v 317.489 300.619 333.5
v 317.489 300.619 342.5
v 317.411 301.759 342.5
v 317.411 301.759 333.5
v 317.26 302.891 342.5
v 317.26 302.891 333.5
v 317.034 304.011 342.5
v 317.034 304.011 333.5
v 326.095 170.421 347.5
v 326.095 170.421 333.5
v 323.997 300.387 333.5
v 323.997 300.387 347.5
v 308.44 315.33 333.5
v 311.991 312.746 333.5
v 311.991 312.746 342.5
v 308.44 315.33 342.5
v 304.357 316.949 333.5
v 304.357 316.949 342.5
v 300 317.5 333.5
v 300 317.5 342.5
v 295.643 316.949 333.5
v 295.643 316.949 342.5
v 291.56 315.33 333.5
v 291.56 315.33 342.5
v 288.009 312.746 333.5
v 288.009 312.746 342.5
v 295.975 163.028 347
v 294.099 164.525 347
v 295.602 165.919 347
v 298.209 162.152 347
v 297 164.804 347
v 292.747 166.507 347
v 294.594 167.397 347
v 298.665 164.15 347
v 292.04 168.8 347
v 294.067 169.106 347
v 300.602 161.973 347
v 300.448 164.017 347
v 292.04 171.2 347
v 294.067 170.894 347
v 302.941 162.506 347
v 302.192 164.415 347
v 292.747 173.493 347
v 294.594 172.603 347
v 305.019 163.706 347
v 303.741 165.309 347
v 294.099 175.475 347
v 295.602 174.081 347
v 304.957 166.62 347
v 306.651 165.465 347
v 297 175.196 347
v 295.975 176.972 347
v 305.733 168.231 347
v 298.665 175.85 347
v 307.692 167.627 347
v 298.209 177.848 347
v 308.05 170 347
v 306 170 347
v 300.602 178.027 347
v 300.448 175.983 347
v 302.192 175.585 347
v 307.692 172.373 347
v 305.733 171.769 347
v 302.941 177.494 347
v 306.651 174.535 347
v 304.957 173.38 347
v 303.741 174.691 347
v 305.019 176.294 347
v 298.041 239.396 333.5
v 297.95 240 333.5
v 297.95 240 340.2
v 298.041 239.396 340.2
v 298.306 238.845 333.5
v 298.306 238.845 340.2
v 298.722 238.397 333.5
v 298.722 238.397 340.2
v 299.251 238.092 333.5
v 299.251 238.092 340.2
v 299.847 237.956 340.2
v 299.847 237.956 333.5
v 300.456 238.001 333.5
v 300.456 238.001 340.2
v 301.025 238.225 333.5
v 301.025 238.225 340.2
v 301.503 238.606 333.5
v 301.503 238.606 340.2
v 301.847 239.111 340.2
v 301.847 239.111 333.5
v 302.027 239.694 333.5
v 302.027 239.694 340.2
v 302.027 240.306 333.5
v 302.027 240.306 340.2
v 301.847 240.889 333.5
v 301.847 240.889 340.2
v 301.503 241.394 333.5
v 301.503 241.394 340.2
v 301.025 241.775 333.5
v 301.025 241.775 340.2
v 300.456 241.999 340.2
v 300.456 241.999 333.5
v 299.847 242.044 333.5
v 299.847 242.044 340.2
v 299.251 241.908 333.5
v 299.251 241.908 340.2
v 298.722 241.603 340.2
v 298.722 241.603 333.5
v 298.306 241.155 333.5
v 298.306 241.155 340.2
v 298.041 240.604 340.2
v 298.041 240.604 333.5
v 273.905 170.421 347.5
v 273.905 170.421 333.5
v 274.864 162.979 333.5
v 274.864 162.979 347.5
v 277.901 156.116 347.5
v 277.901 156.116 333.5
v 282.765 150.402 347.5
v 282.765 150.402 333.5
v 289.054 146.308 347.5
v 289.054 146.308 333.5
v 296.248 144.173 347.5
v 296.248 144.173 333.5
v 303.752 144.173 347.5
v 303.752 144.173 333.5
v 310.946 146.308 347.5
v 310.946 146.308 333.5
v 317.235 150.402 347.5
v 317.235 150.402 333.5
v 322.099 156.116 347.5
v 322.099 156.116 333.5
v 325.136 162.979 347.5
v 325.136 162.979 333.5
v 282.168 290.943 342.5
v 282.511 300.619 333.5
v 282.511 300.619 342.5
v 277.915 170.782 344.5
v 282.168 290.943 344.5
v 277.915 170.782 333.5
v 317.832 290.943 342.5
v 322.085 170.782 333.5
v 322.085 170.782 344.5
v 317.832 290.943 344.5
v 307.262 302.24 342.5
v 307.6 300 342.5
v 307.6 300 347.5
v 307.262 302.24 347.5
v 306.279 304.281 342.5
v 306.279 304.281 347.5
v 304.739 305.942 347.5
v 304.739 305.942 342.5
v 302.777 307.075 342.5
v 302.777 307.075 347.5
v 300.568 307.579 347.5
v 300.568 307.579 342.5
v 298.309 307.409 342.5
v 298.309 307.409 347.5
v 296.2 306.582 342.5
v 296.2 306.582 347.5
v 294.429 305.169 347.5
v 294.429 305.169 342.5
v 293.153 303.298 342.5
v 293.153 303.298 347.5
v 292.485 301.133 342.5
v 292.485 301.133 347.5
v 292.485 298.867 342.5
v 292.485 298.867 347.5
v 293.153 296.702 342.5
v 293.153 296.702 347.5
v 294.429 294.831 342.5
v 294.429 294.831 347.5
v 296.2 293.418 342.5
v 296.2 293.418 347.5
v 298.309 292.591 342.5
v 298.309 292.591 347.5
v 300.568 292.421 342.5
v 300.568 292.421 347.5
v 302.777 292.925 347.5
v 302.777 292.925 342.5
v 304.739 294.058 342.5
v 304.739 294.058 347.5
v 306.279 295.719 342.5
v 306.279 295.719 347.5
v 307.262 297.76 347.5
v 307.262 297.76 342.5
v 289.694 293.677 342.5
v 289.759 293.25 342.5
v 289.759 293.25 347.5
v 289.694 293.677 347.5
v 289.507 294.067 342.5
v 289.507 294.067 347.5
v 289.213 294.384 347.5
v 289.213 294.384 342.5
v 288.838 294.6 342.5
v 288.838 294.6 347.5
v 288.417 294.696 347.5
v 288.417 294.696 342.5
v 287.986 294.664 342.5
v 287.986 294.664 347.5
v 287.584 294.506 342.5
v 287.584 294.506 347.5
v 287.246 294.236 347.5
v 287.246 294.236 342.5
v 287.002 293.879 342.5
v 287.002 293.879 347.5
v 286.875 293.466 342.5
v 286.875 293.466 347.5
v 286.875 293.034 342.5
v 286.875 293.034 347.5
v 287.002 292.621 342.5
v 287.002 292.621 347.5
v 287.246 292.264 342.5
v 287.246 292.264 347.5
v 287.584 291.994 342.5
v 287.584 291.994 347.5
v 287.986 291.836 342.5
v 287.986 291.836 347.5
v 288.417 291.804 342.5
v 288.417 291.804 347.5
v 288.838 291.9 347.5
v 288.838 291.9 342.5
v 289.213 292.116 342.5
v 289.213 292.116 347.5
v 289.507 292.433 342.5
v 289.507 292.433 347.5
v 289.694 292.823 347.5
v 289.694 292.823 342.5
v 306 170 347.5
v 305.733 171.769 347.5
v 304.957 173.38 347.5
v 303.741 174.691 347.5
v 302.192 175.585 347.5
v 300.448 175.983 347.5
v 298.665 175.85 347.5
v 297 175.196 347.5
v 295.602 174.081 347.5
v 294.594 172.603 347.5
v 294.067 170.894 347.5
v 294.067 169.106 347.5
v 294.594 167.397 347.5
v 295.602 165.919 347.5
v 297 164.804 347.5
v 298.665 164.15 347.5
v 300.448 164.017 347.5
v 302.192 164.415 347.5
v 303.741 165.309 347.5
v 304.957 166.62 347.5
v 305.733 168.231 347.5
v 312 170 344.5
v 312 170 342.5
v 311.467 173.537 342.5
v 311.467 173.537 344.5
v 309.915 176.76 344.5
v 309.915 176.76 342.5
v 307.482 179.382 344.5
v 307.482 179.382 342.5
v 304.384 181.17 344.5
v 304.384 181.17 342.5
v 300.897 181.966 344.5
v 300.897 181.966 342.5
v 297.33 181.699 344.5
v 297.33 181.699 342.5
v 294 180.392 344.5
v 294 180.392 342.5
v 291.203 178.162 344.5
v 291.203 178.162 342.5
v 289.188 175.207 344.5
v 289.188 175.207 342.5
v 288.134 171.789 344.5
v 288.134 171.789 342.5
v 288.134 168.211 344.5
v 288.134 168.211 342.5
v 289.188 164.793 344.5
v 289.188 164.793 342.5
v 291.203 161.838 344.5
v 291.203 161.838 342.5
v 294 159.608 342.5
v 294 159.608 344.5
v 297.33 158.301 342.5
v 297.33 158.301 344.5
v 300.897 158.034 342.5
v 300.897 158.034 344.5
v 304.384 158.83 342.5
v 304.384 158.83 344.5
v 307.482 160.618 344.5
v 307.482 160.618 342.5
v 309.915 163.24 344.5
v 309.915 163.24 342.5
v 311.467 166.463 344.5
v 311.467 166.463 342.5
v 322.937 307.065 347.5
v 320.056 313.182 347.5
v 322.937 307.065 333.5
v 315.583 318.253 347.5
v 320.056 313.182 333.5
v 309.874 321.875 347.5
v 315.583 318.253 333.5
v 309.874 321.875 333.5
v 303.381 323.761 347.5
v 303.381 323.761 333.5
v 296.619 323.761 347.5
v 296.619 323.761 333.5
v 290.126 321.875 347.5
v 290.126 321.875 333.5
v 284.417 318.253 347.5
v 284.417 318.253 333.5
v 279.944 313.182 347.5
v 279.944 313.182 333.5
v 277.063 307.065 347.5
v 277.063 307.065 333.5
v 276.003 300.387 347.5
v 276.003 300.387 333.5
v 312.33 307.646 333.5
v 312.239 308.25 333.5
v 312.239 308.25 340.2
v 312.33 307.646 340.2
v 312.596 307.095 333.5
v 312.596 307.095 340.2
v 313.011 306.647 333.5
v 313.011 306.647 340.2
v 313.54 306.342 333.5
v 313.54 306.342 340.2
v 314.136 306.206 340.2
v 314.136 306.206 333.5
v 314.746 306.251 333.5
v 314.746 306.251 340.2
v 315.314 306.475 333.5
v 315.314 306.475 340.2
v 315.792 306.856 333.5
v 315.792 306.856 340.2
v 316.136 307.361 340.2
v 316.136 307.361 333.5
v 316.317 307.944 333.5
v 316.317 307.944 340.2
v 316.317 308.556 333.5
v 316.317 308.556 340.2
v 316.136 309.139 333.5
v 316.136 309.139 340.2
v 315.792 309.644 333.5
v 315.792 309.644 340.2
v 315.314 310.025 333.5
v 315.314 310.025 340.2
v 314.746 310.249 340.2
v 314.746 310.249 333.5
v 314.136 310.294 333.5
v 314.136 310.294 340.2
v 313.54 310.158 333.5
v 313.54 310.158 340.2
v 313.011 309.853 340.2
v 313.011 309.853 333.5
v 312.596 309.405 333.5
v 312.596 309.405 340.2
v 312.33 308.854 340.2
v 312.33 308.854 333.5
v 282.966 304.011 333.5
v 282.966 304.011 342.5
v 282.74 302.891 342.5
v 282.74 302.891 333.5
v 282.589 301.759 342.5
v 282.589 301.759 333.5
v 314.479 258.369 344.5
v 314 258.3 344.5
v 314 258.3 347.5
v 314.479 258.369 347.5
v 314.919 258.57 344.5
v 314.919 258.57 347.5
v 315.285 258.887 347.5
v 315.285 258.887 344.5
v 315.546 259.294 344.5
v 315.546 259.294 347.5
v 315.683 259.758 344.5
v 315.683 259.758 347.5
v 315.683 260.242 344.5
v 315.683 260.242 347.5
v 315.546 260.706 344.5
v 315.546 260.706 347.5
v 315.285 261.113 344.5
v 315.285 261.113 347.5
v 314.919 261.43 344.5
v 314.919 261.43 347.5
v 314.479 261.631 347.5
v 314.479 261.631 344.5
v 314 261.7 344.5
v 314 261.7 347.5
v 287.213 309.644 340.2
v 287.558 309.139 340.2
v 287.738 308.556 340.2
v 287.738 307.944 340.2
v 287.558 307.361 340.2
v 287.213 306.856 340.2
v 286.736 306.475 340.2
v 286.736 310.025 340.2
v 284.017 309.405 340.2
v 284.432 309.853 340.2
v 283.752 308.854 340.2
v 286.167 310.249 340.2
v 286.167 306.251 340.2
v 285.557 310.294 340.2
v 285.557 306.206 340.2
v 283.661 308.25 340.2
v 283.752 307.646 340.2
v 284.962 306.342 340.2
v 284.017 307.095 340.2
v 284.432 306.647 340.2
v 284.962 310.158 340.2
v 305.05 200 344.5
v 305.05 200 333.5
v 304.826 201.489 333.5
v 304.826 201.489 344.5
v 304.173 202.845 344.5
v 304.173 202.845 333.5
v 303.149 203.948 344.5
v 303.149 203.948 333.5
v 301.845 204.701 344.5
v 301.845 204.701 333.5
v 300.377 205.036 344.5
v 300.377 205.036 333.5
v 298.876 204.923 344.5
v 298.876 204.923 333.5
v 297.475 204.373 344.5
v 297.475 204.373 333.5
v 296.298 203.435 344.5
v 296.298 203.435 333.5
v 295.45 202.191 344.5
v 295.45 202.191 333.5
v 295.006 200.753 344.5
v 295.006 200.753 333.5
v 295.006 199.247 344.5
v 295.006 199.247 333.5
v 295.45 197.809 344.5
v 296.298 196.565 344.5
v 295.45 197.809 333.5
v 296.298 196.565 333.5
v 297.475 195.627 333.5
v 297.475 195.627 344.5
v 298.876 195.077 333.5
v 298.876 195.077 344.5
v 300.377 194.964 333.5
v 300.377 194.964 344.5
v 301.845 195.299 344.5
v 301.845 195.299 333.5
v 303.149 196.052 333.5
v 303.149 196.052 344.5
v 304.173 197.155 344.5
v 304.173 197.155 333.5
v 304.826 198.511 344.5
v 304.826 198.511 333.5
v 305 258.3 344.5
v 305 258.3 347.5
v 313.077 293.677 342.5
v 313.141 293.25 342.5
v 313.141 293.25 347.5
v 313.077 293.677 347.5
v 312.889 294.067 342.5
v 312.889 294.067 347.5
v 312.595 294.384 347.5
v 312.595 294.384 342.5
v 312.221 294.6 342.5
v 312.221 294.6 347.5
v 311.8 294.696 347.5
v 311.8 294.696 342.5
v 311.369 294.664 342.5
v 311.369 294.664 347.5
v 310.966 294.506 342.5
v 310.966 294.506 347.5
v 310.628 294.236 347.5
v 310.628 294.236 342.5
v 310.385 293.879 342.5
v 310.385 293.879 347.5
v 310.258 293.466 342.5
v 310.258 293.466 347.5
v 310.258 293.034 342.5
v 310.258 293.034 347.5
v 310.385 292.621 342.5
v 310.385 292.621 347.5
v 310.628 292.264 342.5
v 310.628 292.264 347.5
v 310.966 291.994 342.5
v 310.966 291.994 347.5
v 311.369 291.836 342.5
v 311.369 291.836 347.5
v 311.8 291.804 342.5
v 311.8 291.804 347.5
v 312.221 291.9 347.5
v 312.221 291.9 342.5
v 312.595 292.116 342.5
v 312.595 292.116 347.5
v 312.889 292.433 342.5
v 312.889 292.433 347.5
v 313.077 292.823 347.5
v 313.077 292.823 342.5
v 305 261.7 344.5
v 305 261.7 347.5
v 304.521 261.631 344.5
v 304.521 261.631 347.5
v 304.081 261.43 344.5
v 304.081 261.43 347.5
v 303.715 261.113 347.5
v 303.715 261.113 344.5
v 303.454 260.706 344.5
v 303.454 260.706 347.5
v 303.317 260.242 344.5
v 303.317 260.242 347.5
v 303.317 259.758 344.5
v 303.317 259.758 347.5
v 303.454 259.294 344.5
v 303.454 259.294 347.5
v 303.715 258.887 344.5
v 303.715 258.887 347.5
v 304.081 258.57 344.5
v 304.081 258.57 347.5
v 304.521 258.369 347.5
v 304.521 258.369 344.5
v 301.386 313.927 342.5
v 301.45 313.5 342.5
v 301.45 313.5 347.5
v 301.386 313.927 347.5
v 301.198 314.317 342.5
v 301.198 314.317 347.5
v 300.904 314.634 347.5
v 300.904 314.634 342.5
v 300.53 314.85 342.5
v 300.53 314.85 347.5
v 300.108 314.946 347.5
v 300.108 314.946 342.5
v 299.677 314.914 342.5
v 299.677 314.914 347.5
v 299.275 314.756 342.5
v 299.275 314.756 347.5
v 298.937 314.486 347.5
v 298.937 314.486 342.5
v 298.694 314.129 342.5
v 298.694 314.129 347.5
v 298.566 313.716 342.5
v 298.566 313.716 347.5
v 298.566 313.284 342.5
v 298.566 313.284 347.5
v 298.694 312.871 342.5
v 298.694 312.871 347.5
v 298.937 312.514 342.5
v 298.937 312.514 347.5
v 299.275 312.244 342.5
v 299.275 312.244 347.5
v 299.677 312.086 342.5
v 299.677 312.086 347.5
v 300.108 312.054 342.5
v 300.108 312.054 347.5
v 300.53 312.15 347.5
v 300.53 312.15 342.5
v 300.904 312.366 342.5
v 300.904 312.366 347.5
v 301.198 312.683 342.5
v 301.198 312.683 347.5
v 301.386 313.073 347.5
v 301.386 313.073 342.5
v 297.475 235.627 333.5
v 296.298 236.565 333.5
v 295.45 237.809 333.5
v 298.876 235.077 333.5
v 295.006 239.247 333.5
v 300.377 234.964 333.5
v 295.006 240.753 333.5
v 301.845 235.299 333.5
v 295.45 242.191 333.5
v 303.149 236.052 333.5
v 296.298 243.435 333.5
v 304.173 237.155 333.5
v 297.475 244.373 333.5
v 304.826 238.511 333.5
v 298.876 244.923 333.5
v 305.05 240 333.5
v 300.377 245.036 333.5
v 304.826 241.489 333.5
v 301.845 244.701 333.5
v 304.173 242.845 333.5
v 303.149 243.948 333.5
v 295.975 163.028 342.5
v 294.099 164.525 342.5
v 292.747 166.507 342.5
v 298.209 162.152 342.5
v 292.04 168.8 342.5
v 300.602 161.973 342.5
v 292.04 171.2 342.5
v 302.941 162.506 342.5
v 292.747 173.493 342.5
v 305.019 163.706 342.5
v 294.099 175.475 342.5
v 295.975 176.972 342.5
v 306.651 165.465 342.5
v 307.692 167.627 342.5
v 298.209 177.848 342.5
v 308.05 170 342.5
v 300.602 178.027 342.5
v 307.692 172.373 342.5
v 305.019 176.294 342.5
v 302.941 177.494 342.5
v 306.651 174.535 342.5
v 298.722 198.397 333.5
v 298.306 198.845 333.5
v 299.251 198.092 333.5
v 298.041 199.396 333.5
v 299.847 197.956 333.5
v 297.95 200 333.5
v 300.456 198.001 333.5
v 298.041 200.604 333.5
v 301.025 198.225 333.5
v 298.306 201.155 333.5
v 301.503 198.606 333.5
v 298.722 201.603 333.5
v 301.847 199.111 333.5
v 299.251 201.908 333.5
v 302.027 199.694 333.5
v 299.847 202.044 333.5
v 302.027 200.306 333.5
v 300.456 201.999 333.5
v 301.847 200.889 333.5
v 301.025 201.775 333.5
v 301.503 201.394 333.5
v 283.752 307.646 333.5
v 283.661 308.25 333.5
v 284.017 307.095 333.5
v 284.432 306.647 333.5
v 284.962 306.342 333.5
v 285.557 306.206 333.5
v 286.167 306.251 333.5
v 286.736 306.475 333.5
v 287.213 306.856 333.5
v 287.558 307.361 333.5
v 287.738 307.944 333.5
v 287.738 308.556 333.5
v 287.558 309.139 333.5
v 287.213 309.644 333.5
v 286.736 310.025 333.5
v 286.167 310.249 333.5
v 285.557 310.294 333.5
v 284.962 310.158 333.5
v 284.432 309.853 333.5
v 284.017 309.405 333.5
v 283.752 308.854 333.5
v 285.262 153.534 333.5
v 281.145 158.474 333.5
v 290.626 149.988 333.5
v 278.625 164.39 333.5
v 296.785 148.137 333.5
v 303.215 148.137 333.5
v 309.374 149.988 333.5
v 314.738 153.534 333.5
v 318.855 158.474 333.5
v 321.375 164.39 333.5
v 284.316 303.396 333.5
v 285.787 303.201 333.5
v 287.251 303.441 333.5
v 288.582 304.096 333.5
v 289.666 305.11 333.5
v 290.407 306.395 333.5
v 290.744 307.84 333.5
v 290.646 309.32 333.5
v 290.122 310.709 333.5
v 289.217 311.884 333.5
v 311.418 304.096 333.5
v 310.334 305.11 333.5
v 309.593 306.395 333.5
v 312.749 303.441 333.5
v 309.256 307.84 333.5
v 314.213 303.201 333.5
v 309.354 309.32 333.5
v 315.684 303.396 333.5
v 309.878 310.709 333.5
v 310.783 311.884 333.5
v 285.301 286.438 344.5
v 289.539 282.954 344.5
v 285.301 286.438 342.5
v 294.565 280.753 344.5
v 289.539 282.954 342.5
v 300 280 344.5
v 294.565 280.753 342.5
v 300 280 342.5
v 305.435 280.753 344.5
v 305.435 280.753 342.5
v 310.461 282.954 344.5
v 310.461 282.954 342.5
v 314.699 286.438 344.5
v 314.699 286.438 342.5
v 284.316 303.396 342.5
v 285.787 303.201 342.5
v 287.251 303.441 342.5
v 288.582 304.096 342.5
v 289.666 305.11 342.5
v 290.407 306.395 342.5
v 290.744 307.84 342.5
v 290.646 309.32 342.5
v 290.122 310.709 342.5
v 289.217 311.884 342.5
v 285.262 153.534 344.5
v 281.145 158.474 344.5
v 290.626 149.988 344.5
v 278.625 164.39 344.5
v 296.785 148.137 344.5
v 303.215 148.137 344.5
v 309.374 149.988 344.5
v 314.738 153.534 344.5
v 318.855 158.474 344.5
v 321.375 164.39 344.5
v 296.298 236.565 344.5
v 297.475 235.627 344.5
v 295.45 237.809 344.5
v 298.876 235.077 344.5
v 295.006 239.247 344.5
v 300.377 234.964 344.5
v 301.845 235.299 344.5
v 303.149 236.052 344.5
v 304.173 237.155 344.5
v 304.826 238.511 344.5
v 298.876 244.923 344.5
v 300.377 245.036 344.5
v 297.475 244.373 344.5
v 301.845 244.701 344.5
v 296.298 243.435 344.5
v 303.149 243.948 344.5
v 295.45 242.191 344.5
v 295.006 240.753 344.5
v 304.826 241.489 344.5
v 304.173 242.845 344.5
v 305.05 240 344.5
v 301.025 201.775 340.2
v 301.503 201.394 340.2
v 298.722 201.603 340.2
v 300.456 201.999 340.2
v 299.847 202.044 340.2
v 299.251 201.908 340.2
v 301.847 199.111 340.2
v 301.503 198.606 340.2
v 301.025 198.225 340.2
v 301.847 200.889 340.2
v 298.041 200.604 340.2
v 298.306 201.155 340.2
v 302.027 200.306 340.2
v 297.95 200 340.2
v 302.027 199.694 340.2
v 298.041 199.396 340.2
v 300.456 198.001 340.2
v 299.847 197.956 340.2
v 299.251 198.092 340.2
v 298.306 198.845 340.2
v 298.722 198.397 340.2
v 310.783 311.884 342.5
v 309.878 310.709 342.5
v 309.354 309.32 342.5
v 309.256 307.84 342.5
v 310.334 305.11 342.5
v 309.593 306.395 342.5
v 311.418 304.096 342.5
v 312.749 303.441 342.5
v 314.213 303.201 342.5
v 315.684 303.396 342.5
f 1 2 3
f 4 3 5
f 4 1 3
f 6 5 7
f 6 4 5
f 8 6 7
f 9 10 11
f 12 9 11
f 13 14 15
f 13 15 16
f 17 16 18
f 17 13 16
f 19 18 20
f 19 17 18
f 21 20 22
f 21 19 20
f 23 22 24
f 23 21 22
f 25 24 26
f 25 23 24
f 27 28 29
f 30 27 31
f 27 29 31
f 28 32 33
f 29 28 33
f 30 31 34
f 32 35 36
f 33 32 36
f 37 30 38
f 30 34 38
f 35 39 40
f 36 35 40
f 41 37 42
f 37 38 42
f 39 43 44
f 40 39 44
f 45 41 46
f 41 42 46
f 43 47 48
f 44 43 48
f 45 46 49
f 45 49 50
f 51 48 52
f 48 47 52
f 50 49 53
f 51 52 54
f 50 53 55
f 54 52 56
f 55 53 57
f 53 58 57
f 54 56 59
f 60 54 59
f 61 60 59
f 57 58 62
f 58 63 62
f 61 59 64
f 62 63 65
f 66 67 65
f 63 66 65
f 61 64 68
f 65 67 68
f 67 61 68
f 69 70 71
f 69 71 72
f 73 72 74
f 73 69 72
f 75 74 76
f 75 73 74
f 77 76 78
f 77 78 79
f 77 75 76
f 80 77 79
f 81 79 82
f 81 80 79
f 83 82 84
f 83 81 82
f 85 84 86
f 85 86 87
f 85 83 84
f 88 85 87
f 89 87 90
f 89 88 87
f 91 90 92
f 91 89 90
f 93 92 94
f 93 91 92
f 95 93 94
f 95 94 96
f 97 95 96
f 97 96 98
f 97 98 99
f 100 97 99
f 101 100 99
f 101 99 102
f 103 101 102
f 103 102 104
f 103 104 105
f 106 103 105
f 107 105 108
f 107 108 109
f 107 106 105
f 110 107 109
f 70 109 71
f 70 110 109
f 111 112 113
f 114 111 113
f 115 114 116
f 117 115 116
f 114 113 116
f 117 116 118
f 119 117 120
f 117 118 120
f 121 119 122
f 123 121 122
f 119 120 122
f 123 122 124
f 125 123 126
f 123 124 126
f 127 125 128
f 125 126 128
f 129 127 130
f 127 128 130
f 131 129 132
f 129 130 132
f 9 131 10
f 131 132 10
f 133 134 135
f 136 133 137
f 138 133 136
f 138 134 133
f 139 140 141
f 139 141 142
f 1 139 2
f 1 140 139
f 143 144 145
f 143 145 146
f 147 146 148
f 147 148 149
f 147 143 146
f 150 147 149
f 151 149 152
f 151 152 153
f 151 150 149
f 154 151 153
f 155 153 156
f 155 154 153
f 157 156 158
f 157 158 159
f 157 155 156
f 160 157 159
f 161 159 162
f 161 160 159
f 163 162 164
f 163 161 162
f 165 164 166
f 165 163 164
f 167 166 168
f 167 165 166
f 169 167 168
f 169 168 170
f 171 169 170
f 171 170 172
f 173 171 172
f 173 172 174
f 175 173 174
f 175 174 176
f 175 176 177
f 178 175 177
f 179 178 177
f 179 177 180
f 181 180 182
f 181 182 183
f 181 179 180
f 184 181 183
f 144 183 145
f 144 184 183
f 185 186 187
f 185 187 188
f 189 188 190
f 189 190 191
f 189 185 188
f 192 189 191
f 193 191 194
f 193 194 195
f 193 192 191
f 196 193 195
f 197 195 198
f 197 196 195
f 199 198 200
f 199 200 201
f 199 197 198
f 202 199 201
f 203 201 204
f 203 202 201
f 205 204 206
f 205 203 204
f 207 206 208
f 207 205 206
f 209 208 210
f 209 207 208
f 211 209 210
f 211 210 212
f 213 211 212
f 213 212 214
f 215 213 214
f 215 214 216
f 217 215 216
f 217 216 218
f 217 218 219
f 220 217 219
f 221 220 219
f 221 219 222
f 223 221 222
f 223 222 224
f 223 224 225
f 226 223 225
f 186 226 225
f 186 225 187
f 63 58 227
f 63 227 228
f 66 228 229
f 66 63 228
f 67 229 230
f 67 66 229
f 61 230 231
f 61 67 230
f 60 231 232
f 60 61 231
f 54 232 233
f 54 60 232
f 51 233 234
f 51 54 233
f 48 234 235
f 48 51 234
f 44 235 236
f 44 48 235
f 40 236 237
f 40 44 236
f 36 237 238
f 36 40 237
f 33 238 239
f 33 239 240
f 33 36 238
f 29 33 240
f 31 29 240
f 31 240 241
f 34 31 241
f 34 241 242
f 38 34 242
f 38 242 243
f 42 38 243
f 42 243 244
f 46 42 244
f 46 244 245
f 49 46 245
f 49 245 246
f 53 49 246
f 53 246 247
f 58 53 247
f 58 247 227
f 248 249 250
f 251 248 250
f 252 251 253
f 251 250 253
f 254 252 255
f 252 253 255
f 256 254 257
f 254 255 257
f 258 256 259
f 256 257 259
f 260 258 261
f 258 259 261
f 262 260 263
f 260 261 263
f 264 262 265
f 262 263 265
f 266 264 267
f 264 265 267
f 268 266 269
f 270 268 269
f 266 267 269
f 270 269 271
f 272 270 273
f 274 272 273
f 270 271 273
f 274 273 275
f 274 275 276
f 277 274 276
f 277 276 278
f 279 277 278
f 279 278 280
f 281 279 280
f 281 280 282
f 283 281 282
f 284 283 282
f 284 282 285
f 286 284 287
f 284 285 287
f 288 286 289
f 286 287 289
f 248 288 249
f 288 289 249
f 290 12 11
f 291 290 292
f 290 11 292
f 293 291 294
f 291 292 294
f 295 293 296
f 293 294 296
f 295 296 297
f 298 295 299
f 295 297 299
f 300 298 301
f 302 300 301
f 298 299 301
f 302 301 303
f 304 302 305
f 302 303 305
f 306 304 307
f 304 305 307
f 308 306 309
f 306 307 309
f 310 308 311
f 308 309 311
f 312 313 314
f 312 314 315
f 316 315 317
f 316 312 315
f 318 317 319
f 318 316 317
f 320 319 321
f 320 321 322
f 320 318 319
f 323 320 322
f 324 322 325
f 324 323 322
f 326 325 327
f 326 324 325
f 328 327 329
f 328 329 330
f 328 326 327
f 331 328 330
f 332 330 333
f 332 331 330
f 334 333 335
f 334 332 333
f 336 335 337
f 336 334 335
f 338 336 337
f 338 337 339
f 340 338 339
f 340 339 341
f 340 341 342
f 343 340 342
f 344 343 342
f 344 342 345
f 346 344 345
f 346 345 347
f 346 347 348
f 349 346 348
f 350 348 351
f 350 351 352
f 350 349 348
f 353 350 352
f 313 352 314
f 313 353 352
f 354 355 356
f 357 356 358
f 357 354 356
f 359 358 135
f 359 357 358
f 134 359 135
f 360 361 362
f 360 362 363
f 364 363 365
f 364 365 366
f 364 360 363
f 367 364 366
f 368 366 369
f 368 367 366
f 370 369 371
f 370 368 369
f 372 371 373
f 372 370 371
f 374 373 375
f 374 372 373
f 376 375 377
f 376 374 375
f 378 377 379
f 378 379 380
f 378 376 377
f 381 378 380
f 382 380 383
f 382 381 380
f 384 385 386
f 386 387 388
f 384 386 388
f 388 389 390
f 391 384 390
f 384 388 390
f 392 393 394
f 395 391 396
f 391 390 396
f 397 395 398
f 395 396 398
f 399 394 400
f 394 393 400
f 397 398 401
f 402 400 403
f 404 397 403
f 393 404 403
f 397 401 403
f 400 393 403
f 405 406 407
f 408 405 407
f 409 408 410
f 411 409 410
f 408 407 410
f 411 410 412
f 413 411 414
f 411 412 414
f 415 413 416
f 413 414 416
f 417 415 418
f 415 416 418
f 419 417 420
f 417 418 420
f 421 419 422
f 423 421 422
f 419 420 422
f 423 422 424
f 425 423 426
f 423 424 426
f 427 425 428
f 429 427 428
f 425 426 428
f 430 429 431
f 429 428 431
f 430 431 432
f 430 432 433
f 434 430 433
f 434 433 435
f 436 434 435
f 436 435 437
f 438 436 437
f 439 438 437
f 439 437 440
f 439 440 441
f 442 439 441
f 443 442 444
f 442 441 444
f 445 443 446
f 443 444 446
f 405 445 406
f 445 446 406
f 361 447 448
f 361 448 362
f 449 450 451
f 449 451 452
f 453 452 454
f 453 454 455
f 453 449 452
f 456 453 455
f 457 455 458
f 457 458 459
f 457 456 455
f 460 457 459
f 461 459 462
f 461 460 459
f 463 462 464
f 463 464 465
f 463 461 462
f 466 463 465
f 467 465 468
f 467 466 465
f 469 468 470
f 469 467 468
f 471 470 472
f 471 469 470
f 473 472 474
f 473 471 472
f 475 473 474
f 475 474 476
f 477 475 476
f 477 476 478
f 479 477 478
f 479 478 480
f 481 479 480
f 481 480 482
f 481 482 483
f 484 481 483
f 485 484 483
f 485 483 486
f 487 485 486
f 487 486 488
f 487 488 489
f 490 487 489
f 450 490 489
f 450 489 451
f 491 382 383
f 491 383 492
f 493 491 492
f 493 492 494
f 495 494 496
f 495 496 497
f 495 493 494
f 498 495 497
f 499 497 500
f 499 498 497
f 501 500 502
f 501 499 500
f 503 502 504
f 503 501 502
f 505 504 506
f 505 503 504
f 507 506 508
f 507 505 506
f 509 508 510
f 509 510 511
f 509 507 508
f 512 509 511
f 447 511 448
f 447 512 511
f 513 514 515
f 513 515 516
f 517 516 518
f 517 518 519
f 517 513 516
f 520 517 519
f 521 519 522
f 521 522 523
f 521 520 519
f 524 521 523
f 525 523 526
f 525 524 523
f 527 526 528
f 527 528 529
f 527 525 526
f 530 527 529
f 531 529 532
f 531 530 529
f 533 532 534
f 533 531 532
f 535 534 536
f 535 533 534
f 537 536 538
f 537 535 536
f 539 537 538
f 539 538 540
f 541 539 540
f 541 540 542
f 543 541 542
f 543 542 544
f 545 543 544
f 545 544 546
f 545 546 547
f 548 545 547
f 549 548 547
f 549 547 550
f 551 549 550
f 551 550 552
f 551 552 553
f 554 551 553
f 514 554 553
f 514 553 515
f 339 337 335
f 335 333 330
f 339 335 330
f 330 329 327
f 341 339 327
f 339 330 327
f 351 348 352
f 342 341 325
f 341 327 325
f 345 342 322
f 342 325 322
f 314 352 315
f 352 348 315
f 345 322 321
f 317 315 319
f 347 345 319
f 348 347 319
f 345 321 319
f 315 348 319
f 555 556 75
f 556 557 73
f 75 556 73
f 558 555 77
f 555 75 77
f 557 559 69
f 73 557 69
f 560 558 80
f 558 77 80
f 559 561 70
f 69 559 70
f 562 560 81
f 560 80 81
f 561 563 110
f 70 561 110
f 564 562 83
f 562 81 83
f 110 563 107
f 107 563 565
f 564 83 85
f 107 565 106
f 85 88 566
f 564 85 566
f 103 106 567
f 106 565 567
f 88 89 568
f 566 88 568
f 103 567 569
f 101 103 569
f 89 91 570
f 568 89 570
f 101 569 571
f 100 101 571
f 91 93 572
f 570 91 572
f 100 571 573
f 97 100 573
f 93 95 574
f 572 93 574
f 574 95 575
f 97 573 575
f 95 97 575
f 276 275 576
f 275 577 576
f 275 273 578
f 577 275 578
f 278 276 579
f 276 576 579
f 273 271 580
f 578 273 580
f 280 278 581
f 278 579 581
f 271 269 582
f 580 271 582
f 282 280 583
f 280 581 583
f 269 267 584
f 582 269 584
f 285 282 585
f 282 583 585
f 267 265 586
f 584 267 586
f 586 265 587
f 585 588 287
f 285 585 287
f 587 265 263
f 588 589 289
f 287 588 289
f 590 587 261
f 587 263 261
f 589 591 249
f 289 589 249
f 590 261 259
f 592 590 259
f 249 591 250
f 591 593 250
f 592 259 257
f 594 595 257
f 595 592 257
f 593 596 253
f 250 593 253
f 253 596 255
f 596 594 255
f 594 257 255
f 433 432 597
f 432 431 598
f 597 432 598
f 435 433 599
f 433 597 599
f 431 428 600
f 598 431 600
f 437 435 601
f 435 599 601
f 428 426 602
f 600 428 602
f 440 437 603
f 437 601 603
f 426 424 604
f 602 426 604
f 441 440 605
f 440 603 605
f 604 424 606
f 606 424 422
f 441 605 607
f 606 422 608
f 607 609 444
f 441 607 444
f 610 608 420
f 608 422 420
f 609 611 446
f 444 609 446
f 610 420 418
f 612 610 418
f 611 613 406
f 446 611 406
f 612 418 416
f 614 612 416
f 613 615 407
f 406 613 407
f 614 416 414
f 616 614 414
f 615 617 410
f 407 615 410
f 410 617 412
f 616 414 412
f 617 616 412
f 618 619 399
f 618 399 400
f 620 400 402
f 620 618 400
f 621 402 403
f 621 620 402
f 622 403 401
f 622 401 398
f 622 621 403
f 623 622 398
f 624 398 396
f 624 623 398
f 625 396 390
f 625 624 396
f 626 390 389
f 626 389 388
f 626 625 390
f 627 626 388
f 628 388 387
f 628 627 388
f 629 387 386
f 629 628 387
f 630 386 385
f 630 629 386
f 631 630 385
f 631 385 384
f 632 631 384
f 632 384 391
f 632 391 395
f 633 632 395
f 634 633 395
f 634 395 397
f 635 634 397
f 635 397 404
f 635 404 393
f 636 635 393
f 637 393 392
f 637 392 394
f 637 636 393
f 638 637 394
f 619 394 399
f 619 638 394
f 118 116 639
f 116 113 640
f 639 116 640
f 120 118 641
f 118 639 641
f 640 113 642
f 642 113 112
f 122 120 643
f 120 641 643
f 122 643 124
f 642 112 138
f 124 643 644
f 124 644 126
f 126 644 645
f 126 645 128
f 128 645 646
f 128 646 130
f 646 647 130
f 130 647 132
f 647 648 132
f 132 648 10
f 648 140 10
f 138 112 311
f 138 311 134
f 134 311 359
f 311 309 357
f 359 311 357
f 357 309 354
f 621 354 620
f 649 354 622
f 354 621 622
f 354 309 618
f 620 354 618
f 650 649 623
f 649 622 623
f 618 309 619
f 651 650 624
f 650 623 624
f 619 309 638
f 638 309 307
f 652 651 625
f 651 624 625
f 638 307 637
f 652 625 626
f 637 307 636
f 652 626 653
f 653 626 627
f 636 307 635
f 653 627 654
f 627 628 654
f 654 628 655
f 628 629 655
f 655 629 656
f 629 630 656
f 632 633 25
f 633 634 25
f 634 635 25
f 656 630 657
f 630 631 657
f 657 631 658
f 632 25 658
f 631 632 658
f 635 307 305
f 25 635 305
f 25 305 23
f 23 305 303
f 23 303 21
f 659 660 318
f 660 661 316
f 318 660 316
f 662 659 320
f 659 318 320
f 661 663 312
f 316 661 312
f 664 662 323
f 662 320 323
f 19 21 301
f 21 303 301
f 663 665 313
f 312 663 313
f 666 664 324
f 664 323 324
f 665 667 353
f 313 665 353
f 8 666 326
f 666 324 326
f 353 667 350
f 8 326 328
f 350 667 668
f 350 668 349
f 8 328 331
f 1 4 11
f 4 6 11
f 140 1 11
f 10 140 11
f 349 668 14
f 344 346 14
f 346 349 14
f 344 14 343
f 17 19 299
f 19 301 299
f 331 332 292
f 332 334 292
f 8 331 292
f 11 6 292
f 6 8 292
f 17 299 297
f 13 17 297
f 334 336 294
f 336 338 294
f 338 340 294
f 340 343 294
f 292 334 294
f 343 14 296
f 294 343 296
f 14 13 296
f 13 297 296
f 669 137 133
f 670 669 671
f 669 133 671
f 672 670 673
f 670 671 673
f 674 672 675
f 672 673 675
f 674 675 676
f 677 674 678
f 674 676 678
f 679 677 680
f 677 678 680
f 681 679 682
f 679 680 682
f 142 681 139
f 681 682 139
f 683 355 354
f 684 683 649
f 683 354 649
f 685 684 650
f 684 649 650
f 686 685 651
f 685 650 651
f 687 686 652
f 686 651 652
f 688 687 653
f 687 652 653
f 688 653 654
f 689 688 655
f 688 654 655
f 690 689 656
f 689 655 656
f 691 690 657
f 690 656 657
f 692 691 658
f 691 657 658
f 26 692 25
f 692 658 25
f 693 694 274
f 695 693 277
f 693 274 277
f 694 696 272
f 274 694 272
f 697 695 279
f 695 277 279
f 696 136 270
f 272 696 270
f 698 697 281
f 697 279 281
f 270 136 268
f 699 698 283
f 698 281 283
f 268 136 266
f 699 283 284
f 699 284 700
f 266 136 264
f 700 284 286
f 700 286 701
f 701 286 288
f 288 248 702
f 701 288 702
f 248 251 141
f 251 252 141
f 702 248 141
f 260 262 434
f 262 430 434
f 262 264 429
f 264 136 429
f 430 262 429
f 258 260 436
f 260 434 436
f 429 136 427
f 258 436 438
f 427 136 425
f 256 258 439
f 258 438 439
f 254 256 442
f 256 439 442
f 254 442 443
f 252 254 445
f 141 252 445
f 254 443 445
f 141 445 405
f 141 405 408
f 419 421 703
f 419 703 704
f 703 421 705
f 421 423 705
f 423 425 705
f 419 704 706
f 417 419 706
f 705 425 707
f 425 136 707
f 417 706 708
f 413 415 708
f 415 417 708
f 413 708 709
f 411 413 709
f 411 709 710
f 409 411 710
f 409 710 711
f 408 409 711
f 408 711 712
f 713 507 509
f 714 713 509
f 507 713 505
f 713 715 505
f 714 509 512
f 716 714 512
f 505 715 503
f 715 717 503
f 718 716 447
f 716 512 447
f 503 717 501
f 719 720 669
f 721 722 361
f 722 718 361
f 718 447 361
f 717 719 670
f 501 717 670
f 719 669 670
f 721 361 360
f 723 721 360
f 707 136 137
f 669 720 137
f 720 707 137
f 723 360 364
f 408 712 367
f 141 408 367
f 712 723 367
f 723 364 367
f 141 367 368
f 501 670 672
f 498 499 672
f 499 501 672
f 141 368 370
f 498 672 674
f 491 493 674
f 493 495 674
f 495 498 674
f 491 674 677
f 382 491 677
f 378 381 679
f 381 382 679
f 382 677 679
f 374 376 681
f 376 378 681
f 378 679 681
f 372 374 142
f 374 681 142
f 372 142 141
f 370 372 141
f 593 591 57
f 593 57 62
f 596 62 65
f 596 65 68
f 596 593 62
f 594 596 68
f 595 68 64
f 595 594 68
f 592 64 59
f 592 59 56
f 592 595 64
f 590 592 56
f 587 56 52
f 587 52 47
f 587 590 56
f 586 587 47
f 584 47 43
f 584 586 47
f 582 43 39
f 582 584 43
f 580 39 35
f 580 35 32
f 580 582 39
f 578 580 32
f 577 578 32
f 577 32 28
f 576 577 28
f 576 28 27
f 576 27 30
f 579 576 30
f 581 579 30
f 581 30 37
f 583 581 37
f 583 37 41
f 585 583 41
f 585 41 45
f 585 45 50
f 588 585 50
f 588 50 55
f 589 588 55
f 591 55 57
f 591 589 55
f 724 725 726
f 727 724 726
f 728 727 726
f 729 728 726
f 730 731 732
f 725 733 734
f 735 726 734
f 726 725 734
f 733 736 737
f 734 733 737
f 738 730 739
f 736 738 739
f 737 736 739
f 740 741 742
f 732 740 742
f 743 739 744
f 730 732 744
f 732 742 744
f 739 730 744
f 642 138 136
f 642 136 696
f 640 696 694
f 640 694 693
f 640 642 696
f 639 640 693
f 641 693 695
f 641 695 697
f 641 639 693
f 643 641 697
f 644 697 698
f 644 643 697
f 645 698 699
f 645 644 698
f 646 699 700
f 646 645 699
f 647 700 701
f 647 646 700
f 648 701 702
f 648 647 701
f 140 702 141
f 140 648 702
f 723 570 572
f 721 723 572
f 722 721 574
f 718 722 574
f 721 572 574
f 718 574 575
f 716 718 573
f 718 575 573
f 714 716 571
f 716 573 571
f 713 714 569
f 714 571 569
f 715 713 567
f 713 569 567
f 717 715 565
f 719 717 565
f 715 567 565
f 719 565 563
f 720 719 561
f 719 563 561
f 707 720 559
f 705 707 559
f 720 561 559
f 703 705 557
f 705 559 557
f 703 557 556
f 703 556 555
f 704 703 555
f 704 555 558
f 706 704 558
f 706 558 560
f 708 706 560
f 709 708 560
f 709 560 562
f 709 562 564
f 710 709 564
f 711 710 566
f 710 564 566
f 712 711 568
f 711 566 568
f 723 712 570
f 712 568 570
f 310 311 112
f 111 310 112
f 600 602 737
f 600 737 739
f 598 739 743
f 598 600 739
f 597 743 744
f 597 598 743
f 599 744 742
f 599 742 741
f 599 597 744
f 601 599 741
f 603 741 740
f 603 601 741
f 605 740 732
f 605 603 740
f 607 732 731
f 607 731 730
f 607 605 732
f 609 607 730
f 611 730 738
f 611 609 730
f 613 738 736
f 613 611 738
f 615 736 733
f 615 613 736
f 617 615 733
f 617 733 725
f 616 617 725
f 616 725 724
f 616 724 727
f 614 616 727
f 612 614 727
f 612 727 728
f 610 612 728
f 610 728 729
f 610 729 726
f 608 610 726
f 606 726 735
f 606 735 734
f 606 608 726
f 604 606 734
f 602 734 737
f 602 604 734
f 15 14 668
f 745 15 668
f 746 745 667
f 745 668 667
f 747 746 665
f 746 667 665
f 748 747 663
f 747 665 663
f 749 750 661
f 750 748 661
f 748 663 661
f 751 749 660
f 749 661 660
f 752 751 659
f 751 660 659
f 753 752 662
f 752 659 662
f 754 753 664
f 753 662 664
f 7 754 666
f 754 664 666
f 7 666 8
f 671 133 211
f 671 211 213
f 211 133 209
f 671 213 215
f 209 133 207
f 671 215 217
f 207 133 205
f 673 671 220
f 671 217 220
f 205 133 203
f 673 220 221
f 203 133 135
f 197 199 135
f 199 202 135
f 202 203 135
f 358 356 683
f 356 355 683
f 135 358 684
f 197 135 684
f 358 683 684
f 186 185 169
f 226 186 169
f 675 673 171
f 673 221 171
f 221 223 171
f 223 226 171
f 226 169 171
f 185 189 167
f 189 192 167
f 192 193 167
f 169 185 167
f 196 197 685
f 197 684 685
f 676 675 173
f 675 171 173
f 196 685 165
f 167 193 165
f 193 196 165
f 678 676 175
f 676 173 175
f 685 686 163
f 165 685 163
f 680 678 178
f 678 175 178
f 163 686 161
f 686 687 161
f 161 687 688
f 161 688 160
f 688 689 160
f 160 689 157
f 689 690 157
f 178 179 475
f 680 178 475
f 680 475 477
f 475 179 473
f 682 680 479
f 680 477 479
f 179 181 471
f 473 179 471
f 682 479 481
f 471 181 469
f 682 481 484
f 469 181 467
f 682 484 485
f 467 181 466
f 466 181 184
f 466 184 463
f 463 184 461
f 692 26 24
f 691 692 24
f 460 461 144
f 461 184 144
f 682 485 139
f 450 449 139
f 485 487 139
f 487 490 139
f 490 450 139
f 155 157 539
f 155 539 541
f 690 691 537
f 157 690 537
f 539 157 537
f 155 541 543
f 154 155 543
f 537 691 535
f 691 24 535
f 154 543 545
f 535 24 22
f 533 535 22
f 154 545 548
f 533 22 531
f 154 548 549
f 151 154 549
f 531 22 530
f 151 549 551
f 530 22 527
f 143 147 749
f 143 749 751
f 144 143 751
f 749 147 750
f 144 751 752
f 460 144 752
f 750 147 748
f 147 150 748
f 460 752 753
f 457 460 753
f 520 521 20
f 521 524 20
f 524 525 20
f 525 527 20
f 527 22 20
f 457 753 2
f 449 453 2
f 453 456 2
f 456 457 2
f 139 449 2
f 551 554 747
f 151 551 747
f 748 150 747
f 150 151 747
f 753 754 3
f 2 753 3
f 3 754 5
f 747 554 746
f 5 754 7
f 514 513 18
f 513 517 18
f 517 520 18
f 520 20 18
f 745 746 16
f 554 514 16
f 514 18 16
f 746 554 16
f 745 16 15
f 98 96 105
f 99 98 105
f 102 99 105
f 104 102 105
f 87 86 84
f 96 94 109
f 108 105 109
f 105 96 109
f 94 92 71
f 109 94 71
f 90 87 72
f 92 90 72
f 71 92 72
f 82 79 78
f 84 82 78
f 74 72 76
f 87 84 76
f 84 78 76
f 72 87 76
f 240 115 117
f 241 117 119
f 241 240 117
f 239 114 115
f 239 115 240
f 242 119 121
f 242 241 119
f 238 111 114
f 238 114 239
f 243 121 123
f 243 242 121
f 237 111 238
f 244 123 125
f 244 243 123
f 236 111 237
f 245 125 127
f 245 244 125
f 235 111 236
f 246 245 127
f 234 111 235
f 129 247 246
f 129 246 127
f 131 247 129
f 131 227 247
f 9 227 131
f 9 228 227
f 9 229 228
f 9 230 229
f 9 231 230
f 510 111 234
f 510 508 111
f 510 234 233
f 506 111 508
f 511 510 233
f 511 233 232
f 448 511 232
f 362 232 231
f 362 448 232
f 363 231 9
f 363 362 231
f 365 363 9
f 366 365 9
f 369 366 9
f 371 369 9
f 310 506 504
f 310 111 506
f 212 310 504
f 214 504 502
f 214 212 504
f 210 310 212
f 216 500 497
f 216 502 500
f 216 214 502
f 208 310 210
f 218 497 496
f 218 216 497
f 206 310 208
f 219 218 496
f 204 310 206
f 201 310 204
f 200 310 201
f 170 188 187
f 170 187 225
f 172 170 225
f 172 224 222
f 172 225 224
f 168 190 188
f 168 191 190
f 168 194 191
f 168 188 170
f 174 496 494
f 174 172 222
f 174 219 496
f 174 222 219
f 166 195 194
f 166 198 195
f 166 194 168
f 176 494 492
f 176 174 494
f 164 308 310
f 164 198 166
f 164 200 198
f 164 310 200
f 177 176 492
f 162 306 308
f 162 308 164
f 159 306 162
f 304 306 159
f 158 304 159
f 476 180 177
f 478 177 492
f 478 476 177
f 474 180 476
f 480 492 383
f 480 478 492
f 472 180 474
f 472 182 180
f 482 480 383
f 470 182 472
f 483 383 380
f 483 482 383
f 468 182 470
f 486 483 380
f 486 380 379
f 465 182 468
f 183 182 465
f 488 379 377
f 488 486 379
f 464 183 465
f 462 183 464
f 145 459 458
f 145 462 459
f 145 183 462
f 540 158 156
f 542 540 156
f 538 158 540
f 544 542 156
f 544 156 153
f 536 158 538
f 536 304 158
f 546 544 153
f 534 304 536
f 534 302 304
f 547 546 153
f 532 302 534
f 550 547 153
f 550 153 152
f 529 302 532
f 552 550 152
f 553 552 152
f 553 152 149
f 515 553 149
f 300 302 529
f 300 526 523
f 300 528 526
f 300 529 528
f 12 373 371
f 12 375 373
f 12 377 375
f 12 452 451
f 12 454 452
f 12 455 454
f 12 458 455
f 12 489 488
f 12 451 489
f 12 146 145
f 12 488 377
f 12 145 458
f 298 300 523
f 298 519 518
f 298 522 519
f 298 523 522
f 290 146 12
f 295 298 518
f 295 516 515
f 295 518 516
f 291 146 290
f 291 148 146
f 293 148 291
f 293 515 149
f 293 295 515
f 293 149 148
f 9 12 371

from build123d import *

# Parameters (mm, degrees)
SKETCH1_R           = 6
SKETCH1_R_2         = 1.45
BOSS_EXTRUDE1_DEPTH = 3
SKETCH2_R           = 20
SKETCH2_R_2         = 1.45
BOSS_EXTRUDE2_DEPTH = 2
SKETCH3_R           = 12
SKETCH3_R_2         = 6
BOSS_EXTRUDE3_DEPTH = 2
BOSS_EXTRUDE4_DEPTH = 11
SKETCH5_R           = 5.05
BOSS_EXTRUDE5_DEPTH = 11
SKETCH6_R           = 5.05
BOSS_EXTRUDE6_DEPTH = 11
SKETCH7_R           = 5.05
BOSS_EXTRUDE7_DEPTH = 11
SKETCH8_R           = 5.05
BOSS_EXTRUDE8_DEPTH = 11
SKETCH9_R           = 2.05
CUT_EXTRUDE1_DEPTH  = 6.7
SKETCH10_R          = 7.6
CUT_EXTRUDE2_DEPTH  = 5
SKETCH11_R          = 8.05
CUT_EXTRUDE3_DEPTH  = 4.5


with BuildPart() as part:
    # Sketch1 → Boss-Extrude1 (new body)
    with BuildSketch(Plane.XY.offset(344.5)):
        with BuildLine():
            Line((276.003127371, 300.387432585), (273.904807661, 170.421310226))
            ThreePointArc((273.904807661, 170.421310226), (300, 143.901406829), (326.095192339, 170.421310226))
            Line((326.095192339, 170.421310226), (323.996872629, 300.387432585))
            ThreePointArc((323.996872629, 300.387432585), (300, 324), (276.003127371, 300.387432585))
        make_face()
        with Locations((300, 170)):
            Circle(SKETCH1_R, mode=Mode.SUBTRACT)
        with Locations((300, 313.5)):
            Circle(SKETCH1_R_2, mode=Mode.SUBTRACT)
        with Locations((288.308657049, 293.25)):
            Circle(SKETCH1_R_2, mode=Mode.SUBTRACT)
        with Locations((311.691342951, 293.25)):
            Circle(SKETCH1_R_2, mode=Mode.SUBTRACT)
        with BuildLine():
            Line((305, 258.3), (314, 258.3))
            ThreePointArc((314, 258.3), (315.7, 260), (314, 261.7))
            Line((314, 261.7), (305, 261.7))
            ThreePointArc((305, 261.7), (303.3, 260), (305, 258.3))
        make_face(mode=Mode.SUBTRACT)
    extrude(amount=BOSS_EXTRUDE1_DEPTH)

    # Sketch2 → Boss-Extrude2 (add)
    with BuildSketch(Plane.XY.offset(342.5)):
        with Locations((300, 300)):
            Circle(SKETCH2_R)
        with Locations((300, 313.5)):
            Circle(SKETCH2_R_2, mode=Mode.SUBTRACT)
        with Locations((288.308657049, 293.25)):
            Circle(SKETCH2_R_2, mode=Mode.SUBTRACT)
        with Locations((311.691342951, 293.25)):
            Circle(SKETCH2_R_2, mode=Mode.SUBTRACT)
    extrude(amount=BOSS_EXTRUDE2_DEPTH)

    # Sketch3 → Boss-Extrude3 (add)
    with BuildSketch(Plane.XY.offset(342.5)):
        with Locations((300, 170)):
            Circle(SKETCH3_R)
        with Locations((300, 170)):
            Circle(SKETCH3_R_2, mode=Mode.SUBTRACT)
    extrude(amount=BOSS_EXTRUDE3_DEPTH)

    # Sketch4 → Boss-Extrude4 (add)
    with BuildSketch(Plane.XY.offset(333.5)):
        with BuildLine():
            Line((276.003127371, 300.387432585), (273.904807661, 170.421310226))
            ThreePointArc((273.904807661, 170.421310226), (300, 143.901406829), (326.095192339, 170.421310226))
            Line((326.095192339, 170.421310226), (323.996872629, 300.387432585))
            ThreePointArc((323.996872629, 300.387432585), (300, 324), (276.003127371, 300.387432585))
        make_face()
        with BuildLine():
            Line((282.510952348, 300.619041388), (277.9152372, 170.781711074))
            ThreePointArc((277.9152372, 170.781711074), (300, 147.901406829), (322.0847628, 170.781711074))
            Line((322.0847628, 170.781711074), (317.489047652, 300.619041388))
            ThreePointArc((317.489047652, 300.619041388), (300, 317.5), (282.510952348, 300.619041388))
        make_face(mode=Mode.SUBTRACT)
    extrude(amount=BOSS_EXTRUDE4_DEPTH)

    # Sketch5 → Boss-Extrude5 (add)
    with BuildSketch(Plane.XY.offset(333.5)):
        with Locations((314.289419162, 308.25)):
            Circle(SKETCH5_R)
    extrude(amount=BOSS_EXTRUDE5_DEPTH)

    # Sketch6 → Boss-Extrude6 (add)
    with BuildSketch(Plane.XY.offset(333.5)):
        with Locations((285.710580838, 308.25)):
            Circle(SKETCH6_R)
    extrude(amount=BOSS_EXTRUDE6_DEPTH)

    # Sketch7 → Boss-Extrude7 (add)
    with BuildSketch(Plane.XY.offset(333.5)):
        with Locations((300, 240)):
            Circle(SKETCH7_R)
    extrude(amount=BOSS_EXTRUDE7_DEPTH)

    # Sketch8 → Boss-Extrude8 (add)
    with BuildSketch(Plane.XY.offset(333.5)):
        with Locations((300, 200)):
            Circle(SKETCH8_R)
    extrude(amount=BOSS_EXTRUDE8_DEPTH)

    # Sketch9 → Cut-Extrude1 (cut)
    with BuildSketch(Plane.XY.offset(333.5)):
        with Locations((314.289419162, 308.25)):
            Circle(SKETCH9_R)
        with Locations((285.710580838, 308.25)):
            Circle(SKETCH9_R)
        with Locations((300, 240)):
            Circle(SKETCH9_R)
        with Locations((300, 200)):
            Circle(SKETCH9_R)
    extrude(amount=CUT_EXTRUDE1_DEPTH, mode=Mode.SUBTRACT)

    # Sketch10 → Cut-Extrude2 (cut)
    with BuildSketch(Plane.XY.offset(342.5)):
        with Locations((300, 300)):
            Circle(SKETCH10_R)
    extrude(amount=CUT_EXTRUDE2_DEPTH, mode=Mode.SUBTRACT)

    # Sketch11 → Cut-Extrude3 (cut)
    with BuildSketch(Plane.XY.offset(342.5)):
        with Locations((300, 170)):
            Circle(SKETCH11_R)
    extrude(amount=CUT_EXTRUDE3_DEPTH, mode=Mode.SUBTRACT)


solid = part.part
